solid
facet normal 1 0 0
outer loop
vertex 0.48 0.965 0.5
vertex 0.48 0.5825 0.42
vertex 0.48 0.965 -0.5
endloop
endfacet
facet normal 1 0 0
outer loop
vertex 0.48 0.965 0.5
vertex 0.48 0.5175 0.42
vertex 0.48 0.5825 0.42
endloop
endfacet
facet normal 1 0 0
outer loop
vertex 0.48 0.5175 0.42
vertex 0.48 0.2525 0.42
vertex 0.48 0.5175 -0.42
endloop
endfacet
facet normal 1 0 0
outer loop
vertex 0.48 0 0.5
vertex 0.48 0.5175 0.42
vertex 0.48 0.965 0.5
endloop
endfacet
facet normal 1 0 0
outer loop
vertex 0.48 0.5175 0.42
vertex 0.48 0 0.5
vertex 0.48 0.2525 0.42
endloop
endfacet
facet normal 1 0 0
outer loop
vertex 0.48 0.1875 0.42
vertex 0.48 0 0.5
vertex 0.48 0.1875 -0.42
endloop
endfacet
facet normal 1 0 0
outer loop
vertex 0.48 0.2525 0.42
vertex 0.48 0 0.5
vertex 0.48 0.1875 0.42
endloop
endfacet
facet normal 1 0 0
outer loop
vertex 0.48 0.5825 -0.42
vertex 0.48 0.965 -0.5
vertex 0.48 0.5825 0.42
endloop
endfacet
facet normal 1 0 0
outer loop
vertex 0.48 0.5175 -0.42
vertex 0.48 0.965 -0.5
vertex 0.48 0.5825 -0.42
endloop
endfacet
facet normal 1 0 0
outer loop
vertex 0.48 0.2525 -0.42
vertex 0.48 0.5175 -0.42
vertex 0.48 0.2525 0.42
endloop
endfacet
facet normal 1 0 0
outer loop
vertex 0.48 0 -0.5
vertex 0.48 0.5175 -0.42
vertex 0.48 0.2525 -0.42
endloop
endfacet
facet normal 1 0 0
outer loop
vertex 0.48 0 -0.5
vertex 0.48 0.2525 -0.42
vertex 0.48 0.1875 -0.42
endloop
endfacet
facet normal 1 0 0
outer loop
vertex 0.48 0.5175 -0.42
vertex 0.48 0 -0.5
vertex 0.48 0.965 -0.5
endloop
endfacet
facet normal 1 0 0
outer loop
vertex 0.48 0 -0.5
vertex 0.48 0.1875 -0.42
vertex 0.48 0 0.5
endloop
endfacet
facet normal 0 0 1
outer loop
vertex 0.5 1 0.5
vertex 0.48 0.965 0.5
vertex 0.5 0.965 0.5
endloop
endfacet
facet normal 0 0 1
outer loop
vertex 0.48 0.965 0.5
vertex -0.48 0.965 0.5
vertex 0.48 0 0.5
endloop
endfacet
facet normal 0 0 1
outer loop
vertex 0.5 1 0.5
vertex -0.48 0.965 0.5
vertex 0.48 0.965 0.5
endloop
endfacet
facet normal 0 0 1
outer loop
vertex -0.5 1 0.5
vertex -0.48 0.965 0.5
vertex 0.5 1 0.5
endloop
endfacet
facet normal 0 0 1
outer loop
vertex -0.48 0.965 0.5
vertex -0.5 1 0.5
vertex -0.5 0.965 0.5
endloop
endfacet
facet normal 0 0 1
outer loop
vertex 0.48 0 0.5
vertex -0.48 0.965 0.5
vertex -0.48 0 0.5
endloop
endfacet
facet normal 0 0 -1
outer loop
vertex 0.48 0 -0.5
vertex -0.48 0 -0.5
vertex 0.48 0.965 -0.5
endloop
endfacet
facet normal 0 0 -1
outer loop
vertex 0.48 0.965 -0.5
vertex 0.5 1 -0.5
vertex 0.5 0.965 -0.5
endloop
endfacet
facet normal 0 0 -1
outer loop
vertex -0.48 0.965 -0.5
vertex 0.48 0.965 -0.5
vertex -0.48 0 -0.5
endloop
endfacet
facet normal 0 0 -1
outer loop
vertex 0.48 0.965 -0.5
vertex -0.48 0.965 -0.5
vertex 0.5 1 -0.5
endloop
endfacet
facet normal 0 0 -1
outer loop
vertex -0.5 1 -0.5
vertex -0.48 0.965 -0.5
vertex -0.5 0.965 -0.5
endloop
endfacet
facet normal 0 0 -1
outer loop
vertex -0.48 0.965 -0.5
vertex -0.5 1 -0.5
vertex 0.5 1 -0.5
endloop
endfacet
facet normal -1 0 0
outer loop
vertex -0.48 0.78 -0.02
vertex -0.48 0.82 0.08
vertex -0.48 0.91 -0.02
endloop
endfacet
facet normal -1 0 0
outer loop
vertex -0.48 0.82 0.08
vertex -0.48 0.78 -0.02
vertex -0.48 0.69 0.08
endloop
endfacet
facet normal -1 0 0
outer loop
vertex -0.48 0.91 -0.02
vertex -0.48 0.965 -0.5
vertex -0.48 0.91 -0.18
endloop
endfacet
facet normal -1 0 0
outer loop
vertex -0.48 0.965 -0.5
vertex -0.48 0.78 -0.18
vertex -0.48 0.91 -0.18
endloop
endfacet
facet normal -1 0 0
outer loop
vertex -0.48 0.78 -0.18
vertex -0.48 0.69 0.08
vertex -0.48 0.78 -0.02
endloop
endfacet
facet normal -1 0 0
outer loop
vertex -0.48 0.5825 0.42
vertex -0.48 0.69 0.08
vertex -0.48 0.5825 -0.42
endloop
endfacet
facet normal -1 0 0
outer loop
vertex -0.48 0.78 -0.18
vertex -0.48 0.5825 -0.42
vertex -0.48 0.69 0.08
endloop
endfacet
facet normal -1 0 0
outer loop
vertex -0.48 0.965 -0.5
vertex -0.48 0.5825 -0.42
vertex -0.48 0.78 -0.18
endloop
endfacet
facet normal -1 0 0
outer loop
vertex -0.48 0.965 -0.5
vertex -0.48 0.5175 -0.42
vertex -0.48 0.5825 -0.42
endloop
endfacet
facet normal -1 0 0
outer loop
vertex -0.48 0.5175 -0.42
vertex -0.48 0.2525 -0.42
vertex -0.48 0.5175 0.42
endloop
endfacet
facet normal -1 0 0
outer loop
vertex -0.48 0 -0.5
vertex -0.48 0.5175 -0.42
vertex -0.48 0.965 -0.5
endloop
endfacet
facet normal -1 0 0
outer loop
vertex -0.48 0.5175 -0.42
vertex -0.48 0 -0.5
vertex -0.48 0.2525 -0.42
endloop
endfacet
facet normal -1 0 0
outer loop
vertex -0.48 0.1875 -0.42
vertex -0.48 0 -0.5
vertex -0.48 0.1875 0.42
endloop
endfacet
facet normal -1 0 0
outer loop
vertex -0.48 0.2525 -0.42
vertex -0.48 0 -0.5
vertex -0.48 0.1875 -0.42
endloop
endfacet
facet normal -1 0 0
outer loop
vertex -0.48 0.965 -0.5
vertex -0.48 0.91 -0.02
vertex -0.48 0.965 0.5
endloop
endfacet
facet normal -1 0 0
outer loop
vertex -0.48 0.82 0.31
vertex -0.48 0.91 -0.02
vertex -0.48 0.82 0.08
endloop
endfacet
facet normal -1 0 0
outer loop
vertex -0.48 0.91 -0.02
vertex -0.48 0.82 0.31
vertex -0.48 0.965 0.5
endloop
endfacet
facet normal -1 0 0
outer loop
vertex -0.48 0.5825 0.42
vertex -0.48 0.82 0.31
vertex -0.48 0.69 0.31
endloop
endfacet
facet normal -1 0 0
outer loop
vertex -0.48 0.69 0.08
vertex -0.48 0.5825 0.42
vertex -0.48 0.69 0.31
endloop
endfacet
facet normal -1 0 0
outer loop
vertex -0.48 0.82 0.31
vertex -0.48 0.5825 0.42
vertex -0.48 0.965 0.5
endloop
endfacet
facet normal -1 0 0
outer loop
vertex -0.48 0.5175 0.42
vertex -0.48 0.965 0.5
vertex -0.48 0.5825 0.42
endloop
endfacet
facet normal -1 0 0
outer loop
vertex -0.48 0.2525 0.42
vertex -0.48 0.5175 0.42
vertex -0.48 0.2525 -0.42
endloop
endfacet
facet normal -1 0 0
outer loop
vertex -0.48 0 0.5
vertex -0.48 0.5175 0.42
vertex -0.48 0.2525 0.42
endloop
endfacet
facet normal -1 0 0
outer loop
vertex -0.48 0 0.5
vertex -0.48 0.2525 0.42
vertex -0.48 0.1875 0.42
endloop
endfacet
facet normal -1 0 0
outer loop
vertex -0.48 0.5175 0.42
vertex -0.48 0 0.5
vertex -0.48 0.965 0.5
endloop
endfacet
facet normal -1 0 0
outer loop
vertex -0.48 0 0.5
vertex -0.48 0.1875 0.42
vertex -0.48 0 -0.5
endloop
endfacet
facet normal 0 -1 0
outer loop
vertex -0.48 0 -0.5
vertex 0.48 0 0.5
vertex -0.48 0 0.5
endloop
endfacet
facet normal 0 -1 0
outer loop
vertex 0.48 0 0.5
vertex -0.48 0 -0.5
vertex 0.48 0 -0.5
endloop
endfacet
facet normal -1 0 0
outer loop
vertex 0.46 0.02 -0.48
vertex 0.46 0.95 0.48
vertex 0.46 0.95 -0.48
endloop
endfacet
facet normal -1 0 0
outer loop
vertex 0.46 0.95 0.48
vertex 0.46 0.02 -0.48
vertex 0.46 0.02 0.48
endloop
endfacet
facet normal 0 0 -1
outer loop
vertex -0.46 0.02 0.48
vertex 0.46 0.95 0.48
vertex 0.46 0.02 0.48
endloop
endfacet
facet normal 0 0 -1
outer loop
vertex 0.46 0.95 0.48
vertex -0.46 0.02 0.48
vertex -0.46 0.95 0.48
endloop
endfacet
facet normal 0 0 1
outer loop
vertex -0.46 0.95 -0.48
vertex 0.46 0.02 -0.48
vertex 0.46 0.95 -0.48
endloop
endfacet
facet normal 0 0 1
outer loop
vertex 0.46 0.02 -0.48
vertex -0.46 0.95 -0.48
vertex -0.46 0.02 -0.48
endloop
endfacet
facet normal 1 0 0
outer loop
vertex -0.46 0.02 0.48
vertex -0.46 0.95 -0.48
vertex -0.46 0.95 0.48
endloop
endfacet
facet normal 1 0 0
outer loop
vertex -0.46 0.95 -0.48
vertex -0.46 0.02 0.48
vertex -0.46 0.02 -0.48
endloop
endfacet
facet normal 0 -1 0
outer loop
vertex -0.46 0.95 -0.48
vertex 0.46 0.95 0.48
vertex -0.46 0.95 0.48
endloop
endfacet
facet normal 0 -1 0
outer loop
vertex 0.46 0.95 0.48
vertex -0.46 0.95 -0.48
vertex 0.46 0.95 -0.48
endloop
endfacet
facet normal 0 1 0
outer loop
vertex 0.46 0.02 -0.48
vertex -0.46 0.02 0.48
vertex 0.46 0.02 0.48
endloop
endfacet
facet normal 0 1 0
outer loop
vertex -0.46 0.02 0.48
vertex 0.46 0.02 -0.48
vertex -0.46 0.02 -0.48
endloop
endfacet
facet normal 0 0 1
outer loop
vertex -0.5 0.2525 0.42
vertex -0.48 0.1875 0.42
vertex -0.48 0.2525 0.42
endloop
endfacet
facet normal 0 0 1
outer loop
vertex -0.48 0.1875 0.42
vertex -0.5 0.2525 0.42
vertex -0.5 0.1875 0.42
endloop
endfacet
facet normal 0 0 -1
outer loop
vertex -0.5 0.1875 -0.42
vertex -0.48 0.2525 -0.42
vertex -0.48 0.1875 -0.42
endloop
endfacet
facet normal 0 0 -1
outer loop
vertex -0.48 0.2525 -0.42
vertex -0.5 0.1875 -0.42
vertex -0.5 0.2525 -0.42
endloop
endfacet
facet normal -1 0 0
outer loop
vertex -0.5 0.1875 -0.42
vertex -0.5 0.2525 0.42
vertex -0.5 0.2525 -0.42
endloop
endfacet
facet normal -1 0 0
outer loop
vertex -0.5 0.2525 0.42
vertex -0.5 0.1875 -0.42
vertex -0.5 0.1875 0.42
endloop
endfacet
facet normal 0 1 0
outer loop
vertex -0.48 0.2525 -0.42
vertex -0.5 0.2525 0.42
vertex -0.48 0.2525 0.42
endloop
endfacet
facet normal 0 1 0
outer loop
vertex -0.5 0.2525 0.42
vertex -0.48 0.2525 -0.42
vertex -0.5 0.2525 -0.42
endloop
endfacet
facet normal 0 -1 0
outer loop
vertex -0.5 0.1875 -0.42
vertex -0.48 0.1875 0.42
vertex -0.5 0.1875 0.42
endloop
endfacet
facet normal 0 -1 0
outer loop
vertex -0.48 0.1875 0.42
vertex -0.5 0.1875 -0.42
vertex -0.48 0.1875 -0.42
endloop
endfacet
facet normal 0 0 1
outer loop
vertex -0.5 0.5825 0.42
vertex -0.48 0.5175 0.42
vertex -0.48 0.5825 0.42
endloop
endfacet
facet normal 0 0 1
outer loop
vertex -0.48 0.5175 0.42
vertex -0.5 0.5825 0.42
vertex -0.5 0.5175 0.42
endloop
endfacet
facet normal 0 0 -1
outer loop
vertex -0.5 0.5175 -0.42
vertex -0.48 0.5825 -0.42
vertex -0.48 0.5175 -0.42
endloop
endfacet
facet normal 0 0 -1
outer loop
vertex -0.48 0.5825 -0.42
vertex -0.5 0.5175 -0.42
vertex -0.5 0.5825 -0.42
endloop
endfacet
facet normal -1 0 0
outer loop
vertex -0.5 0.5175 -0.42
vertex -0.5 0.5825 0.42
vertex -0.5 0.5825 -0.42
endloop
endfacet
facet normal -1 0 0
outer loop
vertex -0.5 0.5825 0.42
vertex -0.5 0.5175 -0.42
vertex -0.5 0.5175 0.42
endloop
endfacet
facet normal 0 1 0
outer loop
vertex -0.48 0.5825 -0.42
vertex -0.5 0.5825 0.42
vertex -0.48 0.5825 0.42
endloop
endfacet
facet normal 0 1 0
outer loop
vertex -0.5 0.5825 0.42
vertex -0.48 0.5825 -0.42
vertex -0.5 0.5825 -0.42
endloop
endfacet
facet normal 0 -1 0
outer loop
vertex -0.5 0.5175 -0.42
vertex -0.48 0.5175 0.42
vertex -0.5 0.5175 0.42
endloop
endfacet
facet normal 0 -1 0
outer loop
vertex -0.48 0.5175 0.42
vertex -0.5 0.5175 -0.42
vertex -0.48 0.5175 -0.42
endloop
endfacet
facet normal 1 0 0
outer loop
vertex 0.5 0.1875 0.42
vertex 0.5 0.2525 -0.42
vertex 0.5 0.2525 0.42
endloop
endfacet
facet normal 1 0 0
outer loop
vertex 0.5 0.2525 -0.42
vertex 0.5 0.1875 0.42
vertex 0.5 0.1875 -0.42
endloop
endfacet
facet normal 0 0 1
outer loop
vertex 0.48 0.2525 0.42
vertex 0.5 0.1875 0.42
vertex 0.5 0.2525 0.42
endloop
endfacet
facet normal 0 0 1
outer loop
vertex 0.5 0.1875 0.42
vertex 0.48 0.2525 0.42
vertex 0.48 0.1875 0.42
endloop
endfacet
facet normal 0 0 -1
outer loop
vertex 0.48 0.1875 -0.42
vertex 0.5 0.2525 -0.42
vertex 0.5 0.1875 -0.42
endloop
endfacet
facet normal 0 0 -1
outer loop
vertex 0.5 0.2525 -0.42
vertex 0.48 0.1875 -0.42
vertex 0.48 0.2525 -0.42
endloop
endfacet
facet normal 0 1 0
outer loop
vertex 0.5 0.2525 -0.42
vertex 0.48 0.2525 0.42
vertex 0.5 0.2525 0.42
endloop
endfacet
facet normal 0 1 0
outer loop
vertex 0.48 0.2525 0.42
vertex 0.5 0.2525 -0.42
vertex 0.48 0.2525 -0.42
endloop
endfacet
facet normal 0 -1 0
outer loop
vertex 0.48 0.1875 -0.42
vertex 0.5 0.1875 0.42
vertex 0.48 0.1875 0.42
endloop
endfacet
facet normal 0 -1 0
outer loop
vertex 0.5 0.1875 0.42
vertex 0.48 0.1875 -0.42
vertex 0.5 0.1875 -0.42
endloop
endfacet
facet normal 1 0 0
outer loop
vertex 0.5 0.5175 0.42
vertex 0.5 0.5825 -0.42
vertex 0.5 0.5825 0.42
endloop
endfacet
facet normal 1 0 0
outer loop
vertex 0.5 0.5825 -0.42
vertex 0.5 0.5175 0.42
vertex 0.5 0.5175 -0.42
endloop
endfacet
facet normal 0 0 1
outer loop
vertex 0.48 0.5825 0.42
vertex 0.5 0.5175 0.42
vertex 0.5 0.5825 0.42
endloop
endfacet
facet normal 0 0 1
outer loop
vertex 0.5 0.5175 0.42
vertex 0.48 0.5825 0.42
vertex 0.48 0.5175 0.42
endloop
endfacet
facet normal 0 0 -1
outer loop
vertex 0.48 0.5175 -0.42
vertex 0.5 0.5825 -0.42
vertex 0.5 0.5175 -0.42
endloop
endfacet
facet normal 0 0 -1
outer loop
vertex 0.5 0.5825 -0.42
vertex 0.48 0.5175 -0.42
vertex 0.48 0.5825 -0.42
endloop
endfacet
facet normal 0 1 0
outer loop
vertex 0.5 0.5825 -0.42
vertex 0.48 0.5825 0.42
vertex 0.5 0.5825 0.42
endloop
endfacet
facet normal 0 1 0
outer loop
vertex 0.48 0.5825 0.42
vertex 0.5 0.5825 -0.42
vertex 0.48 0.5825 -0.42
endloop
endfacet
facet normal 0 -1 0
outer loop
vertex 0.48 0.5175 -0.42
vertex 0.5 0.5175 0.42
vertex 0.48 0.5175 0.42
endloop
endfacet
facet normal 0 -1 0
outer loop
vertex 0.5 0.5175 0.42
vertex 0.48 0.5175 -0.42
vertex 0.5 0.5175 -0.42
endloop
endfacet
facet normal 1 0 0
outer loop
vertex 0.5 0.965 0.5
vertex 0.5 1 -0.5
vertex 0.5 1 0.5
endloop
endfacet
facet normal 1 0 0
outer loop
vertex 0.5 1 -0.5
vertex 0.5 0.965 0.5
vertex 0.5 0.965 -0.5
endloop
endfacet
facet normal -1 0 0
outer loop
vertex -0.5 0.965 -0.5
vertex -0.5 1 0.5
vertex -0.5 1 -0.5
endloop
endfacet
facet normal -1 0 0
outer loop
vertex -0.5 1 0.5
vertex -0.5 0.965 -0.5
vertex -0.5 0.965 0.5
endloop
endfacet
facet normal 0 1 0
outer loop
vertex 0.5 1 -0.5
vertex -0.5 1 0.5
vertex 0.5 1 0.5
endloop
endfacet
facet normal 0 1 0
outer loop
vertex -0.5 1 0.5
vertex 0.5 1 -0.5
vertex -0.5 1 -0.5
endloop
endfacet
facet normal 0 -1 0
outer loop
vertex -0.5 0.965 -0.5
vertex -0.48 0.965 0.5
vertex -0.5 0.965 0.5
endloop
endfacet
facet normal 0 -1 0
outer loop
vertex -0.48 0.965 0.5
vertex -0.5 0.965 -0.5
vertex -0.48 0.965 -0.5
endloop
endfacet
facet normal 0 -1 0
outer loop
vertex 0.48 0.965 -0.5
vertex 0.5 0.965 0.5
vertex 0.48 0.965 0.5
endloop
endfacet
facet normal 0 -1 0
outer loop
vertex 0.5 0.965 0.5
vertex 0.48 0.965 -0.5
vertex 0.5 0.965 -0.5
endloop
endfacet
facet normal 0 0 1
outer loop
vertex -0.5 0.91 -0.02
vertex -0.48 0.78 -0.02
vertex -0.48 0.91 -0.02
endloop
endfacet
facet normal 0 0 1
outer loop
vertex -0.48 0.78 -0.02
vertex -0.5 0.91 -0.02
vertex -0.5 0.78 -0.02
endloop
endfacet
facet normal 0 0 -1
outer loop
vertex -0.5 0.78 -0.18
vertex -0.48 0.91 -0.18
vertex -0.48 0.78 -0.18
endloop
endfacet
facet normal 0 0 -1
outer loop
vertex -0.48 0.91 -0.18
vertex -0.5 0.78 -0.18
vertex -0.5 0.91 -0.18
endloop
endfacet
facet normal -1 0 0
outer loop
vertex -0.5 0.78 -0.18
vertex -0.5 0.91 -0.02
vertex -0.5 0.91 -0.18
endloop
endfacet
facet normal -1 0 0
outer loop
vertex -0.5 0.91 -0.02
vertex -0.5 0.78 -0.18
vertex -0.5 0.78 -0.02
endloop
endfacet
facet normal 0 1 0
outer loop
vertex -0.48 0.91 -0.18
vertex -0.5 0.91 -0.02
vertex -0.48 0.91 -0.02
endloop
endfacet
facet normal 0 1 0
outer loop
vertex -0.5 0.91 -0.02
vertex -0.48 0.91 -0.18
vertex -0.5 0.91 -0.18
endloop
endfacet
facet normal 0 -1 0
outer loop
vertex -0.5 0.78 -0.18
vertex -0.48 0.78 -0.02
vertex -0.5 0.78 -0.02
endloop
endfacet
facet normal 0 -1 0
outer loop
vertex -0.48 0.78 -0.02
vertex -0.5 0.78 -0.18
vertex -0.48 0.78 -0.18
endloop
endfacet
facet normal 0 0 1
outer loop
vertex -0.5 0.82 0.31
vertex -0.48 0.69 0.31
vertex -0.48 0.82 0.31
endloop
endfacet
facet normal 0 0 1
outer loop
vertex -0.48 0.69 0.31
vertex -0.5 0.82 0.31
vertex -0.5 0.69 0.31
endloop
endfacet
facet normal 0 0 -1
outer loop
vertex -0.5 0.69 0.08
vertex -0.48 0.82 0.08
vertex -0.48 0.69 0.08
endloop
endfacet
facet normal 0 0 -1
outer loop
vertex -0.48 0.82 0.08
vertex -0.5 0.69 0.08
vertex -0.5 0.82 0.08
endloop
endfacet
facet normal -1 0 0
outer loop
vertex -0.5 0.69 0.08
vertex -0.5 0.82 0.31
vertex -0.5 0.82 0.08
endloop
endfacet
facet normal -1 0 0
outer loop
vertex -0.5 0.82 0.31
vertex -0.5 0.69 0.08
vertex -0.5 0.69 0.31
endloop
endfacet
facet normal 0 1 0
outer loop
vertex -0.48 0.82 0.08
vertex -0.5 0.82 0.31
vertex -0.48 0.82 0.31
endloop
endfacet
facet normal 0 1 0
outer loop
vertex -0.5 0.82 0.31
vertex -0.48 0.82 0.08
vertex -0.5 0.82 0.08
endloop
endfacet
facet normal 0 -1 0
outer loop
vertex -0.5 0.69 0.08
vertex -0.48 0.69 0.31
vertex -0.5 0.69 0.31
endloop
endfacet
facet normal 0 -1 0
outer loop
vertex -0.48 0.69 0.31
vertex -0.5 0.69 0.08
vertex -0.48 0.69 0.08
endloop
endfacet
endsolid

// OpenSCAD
// Unit rack: x width, y height, z length; bottom centre at origin.
wall=0.02;
module belt_box(){
 union(){
  // Closed shell, inset long sides make room for shallow pressed ribs.
  difference(){translate([-.48,0,-.5]) cube([.96,.97,1]); translate([-.48+wall,wall,-.5+wall]) cube([.96-2*wall,.97-2*wall,1-2*wall]);}
  // Lid lip and its inset seam.
  translate([-.5,.965,-.5]) cube([1,.035,1]);
  for(s=[-1,1], y=[.22,.55]) translate([s*.49,y,0]) cube([.02,.065,.84],center=true);
  // Shallow front latch and identification plate.
  translate([-.5,.78,-.18]) cube([.025,.13,.16]);
  translate([-.5,.69,.08]) cube([.025,.13,.23]);
 }
}
belt_box();
